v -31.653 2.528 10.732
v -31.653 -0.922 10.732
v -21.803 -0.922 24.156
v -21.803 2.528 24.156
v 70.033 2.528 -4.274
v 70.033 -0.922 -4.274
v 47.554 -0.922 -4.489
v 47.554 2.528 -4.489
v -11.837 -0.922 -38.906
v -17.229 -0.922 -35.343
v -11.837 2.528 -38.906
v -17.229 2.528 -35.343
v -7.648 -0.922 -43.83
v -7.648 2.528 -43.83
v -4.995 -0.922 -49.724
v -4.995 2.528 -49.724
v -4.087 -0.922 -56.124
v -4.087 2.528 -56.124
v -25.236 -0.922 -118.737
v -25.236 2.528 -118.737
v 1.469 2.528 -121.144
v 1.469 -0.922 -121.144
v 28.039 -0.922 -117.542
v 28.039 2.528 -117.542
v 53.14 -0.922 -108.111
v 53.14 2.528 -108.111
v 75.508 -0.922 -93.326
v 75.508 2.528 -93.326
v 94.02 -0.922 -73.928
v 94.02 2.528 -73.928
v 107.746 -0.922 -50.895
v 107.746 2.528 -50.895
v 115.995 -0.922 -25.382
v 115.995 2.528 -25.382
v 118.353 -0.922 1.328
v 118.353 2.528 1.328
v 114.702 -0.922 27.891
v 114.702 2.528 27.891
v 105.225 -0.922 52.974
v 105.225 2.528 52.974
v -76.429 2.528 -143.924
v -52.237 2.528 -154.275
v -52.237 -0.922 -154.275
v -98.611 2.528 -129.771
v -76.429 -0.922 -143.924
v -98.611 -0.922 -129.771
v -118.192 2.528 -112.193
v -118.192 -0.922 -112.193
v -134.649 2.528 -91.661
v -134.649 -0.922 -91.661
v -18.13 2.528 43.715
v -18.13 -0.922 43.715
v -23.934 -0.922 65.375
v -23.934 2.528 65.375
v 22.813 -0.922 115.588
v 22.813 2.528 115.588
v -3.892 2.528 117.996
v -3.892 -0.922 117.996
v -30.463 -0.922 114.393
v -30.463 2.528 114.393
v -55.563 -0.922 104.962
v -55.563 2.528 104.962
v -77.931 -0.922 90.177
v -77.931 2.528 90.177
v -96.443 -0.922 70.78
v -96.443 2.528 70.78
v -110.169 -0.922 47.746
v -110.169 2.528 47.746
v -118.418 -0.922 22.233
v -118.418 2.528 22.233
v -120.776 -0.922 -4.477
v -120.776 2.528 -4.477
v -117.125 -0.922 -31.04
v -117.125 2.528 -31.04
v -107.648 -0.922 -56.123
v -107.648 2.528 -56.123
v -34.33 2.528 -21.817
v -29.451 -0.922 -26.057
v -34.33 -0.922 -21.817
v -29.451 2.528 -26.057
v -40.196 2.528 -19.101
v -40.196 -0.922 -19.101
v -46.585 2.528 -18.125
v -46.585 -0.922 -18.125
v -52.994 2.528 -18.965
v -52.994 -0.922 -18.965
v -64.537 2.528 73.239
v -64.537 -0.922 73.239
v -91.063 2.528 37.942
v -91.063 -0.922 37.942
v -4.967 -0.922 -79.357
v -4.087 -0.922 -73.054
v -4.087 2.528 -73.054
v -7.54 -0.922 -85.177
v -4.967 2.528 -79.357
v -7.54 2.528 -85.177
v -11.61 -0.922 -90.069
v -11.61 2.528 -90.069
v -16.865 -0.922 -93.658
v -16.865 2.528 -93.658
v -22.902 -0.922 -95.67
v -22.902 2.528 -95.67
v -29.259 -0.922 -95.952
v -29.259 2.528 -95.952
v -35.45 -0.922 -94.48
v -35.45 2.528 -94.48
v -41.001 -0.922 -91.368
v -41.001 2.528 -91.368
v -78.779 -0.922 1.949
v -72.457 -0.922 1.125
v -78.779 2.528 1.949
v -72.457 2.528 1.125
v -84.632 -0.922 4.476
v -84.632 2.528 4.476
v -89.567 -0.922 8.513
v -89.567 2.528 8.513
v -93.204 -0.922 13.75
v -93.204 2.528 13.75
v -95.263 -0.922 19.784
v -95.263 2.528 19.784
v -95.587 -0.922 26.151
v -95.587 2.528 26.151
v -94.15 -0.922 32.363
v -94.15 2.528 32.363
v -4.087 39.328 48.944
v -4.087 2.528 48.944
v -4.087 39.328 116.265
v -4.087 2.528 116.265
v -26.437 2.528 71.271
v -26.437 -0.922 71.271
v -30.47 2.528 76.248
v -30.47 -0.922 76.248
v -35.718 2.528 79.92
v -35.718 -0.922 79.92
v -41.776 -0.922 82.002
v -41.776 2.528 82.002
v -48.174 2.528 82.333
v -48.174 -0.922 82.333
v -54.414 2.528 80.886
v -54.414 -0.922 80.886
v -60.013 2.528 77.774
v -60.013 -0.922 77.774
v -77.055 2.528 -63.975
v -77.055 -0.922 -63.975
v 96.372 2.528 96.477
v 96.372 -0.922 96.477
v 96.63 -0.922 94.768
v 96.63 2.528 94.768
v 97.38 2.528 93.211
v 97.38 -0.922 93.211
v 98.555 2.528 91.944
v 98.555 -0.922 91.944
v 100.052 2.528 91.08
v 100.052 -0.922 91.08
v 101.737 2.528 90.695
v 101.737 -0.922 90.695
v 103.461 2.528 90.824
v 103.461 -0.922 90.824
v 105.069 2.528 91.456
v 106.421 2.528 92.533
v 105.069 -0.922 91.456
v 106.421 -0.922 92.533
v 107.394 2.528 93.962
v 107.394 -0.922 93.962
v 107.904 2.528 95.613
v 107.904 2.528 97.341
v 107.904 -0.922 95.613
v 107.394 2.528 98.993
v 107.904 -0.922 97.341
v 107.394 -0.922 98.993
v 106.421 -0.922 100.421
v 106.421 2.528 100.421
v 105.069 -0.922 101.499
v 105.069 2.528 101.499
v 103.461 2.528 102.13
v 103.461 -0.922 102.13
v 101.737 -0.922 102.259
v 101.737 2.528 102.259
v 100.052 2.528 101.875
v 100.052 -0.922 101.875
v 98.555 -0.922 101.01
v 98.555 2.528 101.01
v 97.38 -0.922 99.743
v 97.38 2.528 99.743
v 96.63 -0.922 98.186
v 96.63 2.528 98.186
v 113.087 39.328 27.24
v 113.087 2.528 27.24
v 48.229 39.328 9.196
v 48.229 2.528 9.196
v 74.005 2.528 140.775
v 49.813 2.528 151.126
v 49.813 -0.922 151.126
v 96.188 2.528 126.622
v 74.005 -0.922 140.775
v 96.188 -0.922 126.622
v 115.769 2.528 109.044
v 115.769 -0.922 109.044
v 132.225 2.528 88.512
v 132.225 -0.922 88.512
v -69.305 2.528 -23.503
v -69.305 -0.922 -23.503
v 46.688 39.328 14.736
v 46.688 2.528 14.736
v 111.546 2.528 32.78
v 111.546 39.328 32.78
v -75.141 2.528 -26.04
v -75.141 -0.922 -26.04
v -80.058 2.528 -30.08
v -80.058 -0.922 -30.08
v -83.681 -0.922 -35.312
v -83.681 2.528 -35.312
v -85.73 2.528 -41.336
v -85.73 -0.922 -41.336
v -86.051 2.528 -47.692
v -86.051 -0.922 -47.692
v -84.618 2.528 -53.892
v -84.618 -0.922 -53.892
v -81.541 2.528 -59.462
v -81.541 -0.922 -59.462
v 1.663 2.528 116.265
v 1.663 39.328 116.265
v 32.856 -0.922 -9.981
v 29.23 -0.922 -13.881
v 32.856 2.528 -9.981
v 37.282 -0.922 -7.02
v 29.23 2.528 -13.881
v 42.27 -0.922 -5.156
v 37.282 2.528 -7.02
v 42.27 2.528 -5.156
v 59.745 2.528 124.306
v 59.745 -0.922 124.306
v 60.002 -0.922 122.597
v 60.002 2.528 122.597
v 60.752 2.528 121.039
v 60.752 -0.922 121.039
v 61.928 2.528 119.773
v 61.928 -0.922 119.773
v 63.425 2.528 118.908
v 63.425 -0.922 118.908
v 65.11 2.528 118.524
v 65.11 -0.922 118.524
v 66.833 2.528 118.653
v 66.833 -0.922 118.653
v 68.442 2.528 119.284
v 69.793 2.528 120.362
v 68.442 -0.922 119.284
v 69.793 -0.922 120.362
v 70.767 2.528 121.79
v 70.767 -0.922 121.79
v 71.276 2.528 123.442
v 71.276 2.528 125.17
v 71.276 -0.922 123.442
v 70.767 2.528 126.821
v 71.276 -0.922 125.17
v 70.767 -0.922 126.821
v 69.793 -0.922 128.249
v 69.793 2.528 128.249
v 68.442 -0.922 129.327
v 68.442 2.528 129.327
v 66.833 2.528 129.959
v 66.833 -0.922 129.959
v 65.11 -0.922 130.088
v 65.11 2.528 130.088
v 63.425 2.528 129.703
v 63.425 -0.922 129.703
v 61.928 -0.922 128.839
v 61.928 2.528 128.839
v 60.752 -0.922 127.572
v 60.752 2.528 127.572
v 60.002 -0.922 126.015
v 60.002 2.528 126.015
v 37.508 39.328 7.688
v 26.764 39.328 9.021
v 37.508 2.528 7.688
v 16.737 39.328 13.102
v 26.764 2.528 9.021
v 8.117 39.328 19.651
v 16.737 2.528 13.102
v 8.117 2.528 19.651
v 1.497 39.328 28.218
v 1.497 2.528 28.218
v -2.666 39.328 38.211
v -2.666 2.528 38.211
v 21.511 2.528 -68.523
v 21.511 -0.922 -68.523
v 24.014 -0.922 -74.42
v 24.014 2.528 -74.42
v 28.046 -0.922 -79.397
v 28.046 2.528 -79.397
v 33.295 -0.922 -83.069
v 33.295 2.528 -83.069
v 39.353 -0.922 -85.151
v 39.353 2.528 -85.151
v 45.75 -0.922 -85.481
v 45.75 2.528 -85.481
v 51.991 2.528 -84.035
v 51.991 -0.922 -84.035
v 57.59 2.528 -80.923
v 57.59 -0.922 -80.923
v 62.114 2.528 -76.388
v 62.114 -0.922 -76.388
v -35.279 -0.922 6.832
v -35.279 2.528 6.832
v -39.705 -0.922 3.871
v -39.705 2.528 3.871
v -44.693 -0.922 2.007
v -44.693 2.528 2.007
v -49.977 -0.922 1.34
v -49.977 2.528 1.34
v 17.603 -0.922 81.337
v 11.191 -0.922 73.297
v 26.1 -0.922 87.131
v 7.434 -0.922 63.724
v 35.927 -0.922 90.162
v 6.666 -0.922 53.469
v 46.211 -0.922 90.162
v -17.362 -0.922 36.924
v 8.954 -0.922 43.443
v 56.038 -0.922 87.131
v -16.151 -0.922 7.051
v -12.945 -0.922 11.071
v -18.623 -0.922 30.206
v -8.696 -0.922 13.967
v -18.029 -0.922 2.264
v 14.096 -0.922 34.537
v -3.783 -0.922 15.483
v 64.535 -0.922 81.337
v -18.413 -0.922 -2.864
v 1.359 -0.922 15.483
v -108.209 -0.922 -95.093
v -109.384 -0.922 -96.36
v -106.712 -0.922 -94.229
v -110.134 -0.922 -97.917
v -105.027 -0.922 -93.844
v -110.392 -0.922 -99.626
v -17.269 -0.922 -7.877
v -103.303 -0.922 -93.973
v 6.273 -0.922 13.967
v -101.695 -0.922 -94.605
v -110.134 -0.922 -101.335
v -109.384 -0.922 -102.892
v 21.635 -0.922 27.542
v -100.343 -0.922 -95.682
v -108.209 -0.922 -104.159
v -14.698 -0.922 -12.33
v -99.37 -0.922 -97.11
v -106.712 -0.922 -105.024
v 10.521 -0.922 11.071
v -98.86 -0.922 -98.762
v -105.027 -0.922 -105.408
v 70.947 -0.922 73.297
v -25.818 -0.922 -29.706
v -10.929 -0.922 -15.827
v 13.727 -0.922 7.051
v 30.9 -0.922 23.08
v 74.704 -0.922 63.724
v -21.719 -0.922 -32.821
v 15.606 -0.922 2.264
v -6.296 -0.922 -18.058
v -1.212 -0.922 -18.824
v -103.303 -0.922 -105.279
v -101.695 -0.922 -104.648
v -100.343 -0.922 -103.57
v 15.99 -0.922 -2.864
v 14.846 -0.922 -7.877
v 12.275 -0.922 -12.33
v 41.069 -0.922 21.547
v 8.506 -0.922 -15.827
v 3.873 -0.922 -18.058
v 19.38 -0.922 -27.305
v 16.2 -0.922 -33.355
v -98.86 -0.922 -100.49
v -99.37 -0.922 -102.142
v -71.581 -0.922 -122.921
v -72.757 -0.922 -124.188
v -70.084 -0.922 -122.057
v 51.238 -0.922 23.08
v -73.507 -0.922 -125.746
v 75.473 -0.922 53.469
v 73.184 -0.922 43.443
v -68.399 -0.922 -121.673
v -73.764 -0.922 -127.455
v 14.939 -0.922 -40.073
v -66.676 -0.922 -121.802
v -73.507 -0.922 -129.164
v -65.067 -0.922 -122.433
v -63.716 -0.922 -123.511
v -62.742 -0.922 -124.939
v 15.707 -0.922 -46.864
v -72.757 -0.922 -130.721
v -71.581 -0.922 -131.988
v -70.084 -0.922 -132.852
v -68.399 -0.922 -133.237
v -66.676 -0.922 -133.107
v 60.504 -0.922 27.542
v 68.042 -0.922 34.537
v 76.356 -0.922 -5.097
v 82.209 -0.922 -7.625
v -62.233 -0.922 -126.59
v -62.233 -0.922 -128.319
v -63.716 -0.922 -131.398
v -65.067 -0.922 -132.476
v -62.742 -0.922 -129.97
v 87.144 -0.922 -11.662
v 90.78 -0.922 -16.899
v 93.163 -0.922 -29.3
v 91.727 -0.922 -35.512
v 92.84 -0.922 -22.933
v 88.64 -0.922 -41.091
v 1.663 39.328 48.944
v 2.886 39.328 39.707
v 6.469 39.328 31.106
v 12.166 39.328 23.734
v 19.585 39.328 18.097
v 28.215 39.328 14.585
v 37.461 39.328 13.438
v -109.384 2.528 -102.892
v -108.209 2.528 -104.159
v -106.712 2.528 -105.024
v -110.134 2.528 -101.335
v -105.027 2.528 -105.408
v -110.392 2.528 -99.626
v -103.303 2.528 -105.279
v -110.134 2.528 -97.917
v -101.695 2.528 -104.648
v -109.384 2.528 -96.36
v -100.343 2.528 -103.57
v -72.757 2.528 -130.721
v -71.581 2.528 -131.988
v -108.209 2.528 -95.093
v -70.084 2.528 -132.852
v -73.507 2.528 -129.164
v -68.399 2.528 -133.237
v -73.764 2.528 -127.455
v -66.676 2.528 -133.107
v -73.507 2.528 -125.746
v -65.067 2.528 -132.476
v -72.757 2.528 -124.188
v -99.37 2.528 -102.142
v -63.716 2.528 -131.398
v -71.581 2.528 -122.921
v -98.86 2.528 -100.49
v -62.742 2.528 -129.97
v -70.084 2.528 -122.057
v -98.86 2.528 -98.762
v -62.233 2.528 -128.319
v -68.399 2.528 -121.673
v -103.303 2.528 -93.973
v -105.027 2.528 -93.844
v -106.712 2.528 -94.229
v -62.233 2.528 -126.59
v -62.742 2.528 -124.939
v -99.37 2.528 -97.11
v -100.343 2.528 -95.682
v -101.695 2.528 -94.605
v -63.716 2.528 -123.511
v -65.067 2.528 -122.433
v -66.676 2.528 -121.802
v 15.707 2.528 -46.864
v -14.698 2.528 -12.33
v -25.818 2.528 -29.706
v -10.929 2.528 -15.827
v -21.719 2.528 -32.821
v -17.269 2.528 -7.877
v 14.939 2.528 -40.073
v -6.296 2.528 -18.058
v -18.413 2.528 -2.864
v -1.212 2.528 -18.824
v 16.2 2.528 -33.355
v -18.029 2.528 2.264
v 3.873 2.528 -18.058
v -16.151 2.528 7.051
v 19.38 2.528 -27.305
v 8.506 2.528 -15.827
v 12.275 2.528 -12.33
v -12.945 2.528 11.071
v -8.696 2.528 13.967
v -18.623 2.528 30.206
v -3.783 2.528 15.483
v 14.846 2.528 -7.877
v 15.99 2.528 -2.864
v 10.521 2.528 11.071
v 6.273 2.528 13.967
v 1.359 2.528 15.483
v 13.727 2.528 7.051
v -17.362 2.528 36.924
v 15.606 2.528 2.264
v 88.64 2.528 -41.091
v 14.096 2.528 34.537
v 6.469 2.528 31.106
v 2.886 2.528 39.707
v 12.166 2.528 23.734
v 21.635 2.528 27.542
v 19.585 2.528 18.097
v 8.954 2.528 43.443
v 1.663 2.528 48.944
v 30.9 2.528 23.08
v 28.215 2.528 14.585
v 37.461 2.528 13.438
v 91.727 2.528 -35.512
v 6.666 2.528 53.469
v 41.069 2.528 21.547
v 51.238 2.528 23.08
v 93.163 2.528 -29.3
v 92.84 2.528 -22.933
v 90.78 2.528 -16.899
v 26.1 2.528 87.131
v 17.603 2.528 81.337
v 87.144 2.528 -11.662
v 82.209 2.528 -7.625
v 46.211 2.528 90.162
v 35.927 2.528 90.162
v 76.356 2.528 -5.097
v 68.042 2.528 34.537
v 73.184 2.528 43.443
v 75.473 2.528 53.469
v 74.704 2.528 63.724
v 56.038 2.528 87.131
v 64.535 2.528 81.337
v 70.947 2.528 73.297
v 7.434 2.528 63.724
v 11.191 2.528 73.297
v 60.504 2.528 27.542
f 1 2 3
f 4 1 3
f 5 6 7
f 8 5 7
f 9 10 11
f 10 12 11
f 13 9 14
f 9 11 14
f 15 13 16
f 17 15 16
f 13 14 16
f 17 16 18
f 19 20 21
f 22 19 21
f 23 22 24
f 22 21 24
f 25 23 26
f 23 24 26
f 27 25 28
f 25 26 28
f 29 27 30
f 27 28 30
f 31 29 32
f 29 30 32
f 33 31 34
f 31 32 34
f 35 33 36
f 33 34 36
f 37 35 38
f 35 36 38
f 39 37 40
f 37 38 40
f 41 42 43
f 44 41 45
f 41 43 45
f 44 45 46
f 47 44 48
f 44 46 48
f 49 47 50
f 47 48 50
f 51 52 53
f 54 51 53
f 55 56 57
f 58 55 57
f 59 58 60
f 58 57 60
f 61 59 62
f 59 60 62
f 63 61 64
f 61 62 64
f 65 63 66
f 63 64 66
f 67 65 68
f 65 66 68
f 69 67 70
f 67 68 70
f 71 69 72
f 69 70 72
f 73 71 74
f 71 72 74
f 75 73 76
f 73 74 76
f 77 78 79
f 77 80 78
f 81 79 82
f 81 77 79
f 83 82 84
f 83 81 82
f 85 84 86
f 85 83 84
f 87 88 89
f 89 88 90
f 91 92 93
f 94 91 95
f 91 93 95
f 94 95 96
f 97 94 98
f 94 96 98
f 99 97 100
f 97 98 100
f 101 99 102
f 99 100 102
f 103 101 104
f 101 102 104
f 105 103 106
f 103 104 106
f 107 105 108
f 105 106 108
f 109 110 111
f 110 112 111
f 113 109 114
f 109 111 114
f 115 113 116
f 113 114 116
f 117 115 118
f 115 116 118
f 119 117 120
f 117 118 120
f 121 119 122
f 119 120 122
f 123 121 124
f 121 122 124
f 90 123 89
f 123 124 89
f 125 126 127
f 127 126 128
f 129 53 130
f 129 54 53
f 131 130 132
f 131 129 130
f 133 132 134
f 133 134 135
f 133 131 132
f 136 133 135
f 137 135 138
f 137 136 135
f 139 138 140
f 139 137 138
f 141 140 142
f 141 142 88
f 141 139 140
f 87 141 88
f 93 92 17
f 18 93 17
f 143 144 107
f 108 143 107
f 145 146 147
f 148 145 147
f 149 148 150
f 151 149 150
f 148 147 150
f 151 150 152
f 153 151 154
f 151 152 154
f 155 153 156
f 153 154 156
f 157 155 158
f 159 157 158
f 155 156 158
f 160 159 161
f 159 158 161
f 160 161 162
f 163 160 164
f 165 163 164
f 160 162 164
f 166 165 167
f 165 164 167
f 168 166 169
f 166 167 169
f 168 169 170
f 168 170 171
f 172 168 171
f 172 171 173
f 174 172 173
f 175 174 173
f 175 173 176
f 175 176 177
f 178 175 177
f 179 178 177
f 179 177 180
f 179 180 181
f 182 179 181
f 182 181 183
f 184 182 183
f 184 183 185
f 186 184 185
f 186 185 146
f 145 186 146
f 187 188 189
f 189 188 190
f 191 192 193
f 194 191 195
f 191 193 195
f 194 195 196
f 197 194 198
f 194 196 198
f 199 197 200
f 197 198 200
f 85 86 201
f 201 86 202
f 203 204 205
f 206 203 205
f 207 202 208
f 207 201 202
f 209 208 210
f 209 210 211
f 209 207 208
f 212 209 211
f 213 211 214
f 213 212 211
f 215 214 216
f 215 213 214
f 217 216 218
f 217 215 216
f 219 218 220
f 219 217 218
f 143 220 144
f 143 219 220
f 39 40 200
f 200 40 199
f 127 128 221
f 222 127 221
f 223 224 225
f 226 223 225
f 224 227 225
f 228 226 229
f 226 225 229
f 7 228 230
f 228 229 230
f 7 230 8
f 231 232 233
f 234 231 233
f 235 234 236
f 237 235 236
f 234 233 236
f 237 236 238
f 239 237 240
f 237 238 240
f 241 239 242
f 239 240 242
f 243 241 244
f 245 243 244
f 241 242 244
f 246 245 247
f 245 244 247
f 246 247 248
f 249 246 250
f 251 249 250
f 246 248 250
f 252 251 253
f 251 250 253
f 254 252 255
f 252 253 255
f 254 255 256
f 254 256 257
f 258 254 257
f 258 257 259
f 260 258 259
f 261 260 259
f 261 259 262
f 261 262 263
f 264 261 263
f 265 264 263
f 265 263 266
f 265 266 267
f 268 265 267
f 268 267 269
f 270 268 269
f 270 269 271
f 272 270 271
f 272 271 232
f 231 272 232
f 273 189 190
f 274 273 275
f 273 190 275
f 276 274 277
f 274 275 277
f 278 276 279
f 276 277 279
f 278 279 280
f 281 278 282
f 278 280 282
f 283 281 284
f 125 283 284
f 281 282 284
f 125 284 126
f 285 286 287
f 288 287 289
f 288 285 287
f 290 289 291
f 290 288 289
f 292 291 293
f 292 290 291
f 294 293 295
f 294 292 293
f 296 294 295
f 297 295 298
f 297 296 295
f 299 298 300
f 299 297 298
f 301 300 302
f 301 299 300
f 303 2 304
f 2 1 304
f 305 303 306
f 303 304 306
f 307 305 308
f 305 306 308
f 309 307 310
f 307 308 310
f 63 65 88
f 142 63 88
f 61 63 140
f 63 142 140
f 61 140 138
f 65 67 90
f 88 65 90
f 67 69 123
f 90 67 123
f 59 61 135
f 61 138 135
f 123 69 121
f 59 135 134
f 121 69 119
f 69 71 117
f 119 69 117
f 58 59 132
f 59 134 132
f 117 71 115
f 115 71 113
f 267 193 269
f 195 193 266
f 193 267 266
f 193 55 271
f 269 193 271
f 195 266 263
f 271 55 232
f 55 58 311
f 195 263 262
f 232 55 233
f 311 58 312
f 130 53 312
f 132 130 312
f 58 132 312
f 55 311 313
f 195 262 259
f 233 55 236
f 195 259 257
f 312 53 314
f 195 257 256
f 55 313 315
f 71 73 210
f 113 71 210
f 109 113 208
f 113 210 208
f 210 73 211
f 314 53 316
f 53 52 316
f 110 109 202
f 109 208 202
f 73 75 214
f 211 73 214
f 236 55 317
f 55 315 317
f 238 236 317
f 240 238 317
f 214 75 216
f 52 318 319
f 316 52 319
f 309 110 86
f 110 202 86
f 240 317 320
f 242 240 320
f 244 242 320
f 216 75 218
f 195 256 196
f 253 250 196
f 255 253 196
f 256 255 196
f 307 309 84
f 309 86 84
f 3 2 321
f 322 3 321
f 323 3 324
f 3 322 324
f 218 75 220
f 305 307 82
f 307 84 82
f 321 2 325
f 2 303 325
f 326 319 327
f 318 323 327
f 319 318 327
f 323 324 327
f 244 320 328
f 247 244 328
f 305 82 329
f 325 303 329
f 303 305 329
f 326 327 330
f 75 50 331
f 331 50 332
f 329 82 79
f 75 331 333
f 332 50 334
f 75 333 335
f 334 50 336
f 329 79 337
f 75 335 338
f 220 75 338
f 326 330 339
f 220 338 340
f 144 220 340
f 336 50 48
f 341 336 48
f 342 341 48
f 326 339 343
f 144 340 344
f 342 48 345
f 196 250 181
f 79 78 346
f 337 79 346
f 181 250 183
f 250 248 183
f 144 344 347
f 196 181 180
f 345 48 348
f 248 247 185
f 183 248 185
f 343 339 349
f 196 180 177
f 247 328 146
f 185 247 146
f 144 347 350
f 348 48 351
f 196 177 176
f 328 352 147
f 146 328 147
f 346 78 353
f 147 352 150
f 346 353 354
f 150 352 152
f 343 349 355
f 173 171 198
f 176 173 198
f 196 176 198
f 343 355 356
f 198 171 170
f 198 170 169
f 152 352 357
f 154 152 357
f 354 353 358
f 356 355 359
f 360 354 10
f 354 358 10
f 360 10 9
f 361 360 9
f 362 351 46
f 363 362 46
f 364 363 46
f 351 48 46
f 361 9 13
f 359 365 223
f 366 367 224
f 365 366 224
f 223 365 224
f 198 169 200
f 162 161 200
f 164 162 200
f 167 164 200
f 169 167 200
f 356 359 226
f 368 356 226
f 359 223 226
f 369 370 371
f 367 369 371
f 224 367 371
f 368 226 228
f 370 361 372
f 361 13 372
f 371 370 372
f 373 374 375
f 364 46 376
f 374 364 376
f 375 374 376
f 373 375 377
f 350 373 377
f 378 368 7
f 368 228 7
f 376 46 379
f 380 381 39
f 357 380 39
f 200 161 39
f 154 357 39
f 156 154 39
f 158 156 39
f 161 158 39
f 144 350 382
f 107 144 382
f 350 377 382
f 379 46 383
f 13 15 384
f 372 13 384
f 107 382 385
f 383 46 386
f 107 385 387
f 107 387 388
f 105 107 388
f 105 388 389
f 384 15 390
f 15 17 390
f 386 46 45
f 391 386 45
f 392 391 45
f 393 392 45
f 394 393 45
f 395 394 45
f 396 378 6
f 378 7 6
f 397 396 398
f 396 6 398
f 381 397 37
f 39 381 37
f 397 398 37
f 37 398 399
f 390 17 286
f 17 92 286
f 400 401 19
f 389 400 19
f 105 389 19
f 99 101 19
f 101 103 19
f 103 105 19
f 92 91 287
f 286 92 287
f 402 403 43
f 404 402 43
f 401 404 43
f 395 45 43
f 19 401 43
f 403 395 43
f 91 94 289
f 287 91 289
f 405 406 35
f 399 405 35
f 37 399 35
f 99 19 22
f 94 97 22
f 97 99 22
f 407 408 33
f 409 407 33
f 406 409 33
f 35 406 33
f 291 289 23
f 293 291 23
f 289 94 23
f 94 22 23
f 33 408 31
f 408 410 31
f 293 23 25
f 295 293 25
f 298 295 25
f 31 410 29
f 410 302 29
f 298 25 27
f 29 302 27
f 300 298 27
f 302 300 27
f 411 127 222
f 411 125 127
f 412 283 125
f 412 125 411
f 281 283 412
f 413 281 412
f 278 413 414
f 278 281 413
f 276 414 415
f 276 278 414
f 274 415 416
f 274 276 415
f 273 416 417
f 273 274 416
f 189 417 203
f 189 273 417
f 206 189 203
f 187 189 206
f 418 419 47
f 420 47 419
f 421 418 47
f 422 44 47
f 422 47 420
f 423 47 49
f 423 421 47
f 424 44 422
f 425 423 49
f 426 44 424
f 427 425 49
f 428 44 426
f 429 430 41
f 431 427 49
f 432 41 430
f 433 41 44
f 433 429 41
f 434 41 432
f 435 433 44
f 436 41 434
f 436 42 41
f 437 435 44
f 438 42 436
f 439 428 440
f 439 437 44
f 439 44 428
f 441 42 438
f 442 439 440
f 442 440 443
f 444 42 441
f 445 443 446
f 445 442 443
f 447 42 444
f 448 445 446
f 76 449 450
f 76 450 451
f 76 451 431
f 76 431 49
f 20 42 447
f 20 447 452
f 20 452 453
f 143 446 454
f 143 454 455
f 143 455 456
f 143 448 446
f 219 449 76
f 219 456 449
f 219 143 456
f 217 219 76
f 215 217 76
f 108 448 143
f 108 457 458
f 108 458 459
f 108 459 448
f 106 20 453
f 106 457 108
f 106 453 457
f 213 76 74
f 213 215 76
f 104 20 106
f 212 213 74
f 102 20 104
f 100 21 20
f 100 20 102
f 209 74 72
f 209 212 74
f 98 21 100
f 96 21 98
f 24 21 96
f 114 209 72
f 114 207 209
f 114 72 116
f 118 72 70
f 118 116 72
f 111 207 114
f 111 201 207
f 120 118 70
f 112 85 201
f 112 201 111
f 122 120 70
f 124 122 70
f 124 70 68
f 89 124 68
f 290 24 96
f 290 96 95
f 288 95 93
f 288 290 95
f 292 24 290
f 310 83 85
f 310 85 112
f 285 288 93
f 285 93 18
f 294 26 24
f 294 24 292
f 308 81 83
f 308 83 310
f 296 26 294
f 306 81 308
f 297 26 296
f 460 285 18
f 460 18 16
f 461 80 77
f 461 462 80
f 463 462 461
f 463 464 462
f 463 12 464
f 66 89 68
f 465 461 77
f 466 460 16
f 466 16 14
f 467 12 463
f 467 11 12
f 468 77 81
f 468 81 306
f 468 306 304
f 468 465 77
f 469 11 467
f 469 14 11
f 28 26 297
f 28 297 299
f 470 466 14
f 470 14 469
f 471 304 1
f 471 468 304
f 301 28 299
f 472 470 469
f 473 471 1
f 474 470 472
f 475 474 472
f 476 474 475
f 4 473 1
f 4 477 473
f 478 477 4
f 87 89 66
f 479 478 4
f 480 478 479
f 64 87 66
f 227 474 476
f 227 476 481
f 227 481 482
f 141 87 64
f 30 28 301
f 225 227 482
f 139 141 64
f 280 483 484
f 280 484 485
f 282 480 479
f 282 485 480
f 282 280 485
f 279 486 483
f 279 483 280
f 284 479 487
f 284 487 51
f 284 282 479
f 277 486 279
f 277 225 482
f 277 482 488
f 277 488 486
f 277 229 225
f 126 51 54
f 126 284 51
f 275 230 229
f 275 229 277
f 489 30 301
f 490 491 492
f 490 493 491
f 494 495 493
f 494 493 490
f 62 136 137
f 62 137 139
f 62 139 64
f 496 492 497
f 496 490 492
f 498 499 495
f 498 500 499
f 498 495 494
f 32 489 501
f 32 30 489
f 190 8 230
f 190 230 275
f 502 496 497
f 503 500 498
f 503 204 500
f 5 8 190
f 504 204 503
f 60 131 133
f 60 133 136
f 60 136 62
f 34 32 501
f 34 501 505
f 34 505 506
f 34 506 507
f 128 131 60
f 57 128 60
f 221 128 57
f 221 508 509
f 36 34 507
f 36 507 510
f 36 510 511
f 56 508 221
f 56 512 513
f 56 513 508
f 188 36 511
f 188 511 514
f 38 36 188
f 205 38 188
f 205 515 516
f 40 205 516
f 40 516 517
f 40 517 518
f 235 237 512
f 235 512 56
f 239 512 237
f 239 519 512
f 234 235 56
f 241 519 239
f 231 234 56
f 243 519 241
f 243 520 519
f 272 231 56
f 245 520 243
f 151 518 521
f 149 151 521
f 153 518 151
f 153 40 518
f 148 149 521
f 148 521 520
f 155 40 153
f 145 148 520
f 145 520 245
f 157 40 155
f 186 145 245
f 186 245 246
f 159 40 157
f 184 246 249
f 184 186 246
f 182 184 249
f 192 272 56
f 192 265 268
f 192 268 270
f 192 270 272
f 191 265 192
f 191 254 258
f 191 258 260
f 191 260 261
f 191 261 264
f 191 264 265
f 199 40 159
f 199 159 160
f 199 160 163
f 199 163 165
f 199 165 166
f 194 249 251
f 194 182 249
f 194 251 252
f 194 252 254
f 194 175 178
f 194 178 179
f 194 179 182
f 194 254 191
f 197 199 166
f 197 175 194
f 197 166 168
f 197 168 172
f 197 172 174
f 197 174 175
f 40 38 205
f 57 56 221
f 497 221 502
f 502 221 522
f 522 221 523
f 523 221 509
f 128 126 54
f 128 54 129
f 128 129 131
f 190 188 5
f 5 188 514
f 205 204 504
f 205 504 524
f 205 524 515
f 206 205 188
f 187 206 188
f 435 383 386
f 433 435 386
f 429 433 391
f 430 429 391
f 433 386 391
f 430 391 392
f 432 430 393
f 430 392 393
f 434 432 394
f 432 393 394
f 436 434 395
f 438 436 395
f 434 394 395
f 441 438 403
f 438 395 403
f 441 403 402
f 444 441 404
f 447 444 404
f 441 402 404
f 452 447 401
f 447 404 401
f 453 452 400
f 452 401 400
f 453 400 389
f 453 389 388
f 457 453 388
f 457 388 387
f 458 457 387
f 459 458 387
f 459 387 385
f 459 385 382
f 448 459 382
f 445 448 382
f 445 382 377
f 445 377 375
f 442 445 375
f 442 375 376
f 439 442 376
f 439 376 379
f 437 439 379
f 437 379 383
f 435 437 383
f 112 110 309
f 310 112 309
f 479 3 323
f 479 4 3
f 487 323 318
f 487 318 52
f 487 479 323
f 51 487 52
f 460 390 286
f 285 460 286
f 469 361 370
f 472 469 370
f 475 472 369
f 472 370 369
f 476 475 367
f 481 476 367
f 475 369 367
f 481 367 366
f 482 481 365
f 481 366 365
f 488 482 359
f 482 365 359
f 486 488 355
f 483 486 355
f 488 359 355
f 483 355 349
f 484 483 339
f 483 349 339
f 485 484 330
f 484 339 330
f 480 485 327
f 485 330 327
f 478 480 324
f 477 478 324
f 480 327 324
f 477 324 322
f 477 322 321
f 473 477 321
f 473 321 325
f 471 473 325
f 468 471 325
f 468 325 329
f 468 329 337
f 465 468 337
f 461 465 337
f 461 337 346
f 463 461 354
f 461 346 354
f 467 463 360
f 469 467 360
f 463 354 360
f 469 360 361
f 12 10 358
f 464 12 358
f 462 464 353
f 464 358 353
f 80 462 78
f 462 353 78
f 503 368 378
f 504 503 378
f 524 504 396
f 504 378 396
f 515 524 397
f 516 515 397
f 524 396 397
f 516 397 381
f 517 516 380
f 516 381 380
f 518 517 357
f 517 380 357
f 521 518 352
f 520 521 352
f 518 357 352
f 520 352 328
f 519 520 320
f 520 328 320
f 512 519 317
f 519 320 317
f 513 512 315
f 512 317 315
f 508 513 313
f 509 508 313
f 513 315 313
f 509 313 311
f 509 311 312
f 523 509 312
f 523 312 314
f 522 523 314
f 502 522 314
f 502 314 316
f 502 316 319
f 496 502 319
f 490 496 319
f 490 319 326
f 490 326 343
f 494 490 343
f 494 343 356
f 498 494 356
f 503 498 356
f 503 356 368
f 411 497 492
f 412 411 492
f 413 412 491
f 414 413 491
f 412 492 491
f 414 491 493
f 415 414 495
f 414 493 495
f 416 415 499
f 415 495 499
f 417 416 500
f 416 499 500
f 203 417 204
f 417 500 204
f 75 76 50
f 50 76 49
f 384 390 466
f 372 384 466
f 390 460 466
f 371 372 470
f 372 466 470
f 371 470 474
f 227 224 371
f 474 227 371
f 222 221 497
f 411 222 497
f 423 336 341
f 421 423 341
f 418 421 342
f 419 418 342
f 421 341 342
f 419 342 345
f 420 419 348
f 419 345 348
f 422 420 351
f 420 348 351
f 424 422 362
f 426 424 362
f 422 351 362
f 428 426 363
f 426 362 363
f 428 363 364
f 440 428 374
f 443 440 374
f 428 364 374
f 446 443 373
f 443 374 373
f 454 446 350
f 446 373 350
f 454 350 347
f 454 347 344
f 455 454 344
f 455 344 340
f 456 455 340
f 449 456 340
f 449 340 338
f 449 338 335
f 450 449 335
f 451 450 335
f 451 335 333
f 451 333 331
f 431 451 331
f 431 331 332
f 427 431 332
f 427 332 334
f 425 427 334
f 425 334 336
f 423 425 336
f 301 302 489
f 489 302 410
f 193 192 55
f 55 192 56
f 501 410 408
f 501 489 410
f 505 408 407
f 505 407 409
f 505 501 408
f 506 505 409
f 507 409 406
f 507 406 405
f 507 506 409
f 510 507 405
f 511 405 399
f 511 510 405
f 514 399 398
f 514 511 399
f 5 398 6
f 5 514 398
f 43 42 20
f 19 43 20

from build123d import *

# Parameters (mm, degrees)
CROQUIS1_R                    = 140
SALIENTE_EXTRUIR1_DEPTH       = 3
SALIENTE_EXTRUIR2_DEPTH       = 35
CROQUIS3_5_R                  = 30
CROQUIS3_5_R_2                = 13.2
CORTAR_EXTRUIR3_DEPTH         = 150
TALADRO_DE_MARGEN_PARA_3_81_D = 10.0838
CORTAR_EXTRUIR4_DEPTH         = 10
REDONDEO1_R                   = 20
CROQUIS7_R                    = 15
CORTAR_EXTRUIR5_DEPTH         = 3
ESCALA1_SCALE                 = 1.15


with BuildPart() as part:
    # Croquis1 → Saliente-Extruir1 (new body)
    with BuildSketch(Plane(origin=(0, 0, 0), x_dir=(1, 0, 0), z_dir=(0, 1, 0))):
        with Locations(Location((0, 0, 0), (0, 0, 270))):
            Circle(CROQUIS1_R)
    extrude(amount=SALIENTE_EXTRUIR1_DEPTH)

    # Croquis3 → Saliente-Extruir2 (add)
    with BuildSketch(Plane(origin=(0, 0, 0), x_dir=(-1, 0, 0), z_dir=(0, -1, 0))):
        with BuildLine():
            Line((2.5, -102.46950766), (-2.5, -102.46950766))
            Line((-2.5, -102.46950766), (-2.5, -43.928919859))
            ThreePointArc((-2.5, -43.928919859), (-14.696982207, -19.344018802), (-41.651497534, -14.182833045))
            Line((-41.651497534, -14.182833045), (-98.050103968, -29.873518571))
            Line((-98.050103968, -29.873518571), (-99.390258391, -25.056466971))
            Line((-99.390258391, -25.056466971), (-42.991651956, -9.365781444))
            ThreePointArc((-42.991651956, -9.365781444), (-11.672149328, -15.36276447), (2.5, -43.928919859))
            Line((2.5, -43.928919859), (2.5, -102.46950766))
        make_face()
    extrude(amount=-SALIENTE_EXTRUIR2_DEPTH)

    # Croquis3<5> → Cortar-Extruir3 (cut)
    with BuildSketch(Plane(origin=(0, 0, 0), x_dir=(-1, 0, 0), z_dir=(0, -1, 0))):
        Polygon((12.227859388, -30.111948705), (30.38932597, -97.89146473), (102.481249664, -1.960476316), (32.393429517, -2.62977644), align=None)
        with Locations(Location((-36.766027199, -50.10571417, 0), (0, 0, 90))):
            Circle(CROQUIS3_5_R)
        Polygon((-30.38932597, 97.89146473), (-102.481249664, 1.960476316), (-32.393429517, 2.62977644), (-12.227859388, 30.111948705), align=None)
        with BuildLine():
            Line((30.547985144, 11.093719108), (98.050103968, 29.873518571))
            Line((98.050103968, 29.873518571), (2.5, 102.46950766))
            Line((2.5, 102.46950766), (2.5, 32.403703492))
            ThreePointArc((2.5, 32.403703492), (19.661413711, 25.878153158), (30.547985144, 11.093719108))
        make_face()
        with Locations(Location((0, 0, 0), (0, 0, 90))):
            Circle(CROQUIS3_5_R_2)
    extrude(amount=-CORTAR_EXTRUIR3_DEPTH, mode=Mode.SUBTRACT)

    # Taladro de margen para 3/81 (through all)
    with Locations(Plane(origin=(0, 3, 0), x_dir=(1, 0, 0), z_dir=(0, 1, 0))):
        with Locations((58.047355757, -109.461018128), (89.897390413, -85.262355099), (-58.047355757, 109.461018128), (-89.897390413, 85.262355099)):
            Hole(TALADRO_DE_MARGEN_PARA_3_81_D / 2)

    # Croquis6 → Cortar-Extruir4 (cut)
    with BuildSketch(Plane(origin=(0, 3, 0), x_dir=(1, 0, 0), z_dir=(0, 1, 0))):
        with BuildLine():
            Line((-92.55315644, 47.433250289), (-138.14042031, 107.434744271))
            ThreePointArc((-138.14042031, 107.434744271), (-139.34390162, -105.869150753), (66.477842334, -161.881736087))
            Line((66.477842334, -161.881736087), (20.890578464, -101.880242105))
            ThreePointArc((20.890578464, -101.880242105), (-82.810090106, -62.916523876), (-92.55315644, 47.433250289))
        make_face()
        with BuildLine():
            Line((-66.477842334, 161.881736087), (-20.890578464, 101.880242105))
            ThreePointArc((-20.890578464, 101.880242105), (82.810090106, 62.916523876), (92.55315644, -47.433250289))
            Line((92.55315644, -47.433250289), (138.14042031, -107.434744271))
            ThreePointArc((138.14042031, -107.434744271), (139.34390162, 105.869150753), (-66.477842334, 161.881736087))
        make_face()
    extrude(amount=-CORTAR_EXTRUIR4_DEPTH, mode=Mode.SUBTRACT)

    # Redondeo1
    redondeo1_edges = [part.edges().sort_by_distance(p)[0] for p in [
        (-30.547985144, 1.5, -11.093719108),
        (-2.5, 1.5, -32.403703492),
        (-2.5, 1.5, -102.46950766),
        (-98.050103968, 1.5, -29.873518571),
        (-12.227859388, 1.5, 30.111948705),
        (-32.393429517, 1.5, 2.62977644),
        (-102.481249664, 1.5, 1.960476316),
        (-30.38932597, 1.5, 97.89146473),
        (12.227859388, 1.5, -30.111948705),
        (32.393429517, 1.5, -2.62977644),
        (102.481249664, 1.5, -1.960476316),
        (30.38932597, 1.5, -97.89146473),
    ]]
    fillet(redondeo1_edges, radius=REDONDEO1_R)

    # Croquis7 → Cortar-Extruir5 (cut)
    with BuildSketch(Plane.XZ):
        with Locations(Location((0, 0, 0), (0, 0, 270))):
            Circle(CROQUIS7_R)
    extrude(amount=-CORTAR_EXTRUIR5_DEPTH, mode=Mode.SUBTRACT)


with BuildPart() as part_1:
    # Escala1: scaled about (8.077452508, 6.145488529, 10.496326588)
    add(part.part.scale(ESCALA1_SCALE).moved(Location((-1.211617876, -0.921823279, -1.574448988))))


solid = part_1.part
